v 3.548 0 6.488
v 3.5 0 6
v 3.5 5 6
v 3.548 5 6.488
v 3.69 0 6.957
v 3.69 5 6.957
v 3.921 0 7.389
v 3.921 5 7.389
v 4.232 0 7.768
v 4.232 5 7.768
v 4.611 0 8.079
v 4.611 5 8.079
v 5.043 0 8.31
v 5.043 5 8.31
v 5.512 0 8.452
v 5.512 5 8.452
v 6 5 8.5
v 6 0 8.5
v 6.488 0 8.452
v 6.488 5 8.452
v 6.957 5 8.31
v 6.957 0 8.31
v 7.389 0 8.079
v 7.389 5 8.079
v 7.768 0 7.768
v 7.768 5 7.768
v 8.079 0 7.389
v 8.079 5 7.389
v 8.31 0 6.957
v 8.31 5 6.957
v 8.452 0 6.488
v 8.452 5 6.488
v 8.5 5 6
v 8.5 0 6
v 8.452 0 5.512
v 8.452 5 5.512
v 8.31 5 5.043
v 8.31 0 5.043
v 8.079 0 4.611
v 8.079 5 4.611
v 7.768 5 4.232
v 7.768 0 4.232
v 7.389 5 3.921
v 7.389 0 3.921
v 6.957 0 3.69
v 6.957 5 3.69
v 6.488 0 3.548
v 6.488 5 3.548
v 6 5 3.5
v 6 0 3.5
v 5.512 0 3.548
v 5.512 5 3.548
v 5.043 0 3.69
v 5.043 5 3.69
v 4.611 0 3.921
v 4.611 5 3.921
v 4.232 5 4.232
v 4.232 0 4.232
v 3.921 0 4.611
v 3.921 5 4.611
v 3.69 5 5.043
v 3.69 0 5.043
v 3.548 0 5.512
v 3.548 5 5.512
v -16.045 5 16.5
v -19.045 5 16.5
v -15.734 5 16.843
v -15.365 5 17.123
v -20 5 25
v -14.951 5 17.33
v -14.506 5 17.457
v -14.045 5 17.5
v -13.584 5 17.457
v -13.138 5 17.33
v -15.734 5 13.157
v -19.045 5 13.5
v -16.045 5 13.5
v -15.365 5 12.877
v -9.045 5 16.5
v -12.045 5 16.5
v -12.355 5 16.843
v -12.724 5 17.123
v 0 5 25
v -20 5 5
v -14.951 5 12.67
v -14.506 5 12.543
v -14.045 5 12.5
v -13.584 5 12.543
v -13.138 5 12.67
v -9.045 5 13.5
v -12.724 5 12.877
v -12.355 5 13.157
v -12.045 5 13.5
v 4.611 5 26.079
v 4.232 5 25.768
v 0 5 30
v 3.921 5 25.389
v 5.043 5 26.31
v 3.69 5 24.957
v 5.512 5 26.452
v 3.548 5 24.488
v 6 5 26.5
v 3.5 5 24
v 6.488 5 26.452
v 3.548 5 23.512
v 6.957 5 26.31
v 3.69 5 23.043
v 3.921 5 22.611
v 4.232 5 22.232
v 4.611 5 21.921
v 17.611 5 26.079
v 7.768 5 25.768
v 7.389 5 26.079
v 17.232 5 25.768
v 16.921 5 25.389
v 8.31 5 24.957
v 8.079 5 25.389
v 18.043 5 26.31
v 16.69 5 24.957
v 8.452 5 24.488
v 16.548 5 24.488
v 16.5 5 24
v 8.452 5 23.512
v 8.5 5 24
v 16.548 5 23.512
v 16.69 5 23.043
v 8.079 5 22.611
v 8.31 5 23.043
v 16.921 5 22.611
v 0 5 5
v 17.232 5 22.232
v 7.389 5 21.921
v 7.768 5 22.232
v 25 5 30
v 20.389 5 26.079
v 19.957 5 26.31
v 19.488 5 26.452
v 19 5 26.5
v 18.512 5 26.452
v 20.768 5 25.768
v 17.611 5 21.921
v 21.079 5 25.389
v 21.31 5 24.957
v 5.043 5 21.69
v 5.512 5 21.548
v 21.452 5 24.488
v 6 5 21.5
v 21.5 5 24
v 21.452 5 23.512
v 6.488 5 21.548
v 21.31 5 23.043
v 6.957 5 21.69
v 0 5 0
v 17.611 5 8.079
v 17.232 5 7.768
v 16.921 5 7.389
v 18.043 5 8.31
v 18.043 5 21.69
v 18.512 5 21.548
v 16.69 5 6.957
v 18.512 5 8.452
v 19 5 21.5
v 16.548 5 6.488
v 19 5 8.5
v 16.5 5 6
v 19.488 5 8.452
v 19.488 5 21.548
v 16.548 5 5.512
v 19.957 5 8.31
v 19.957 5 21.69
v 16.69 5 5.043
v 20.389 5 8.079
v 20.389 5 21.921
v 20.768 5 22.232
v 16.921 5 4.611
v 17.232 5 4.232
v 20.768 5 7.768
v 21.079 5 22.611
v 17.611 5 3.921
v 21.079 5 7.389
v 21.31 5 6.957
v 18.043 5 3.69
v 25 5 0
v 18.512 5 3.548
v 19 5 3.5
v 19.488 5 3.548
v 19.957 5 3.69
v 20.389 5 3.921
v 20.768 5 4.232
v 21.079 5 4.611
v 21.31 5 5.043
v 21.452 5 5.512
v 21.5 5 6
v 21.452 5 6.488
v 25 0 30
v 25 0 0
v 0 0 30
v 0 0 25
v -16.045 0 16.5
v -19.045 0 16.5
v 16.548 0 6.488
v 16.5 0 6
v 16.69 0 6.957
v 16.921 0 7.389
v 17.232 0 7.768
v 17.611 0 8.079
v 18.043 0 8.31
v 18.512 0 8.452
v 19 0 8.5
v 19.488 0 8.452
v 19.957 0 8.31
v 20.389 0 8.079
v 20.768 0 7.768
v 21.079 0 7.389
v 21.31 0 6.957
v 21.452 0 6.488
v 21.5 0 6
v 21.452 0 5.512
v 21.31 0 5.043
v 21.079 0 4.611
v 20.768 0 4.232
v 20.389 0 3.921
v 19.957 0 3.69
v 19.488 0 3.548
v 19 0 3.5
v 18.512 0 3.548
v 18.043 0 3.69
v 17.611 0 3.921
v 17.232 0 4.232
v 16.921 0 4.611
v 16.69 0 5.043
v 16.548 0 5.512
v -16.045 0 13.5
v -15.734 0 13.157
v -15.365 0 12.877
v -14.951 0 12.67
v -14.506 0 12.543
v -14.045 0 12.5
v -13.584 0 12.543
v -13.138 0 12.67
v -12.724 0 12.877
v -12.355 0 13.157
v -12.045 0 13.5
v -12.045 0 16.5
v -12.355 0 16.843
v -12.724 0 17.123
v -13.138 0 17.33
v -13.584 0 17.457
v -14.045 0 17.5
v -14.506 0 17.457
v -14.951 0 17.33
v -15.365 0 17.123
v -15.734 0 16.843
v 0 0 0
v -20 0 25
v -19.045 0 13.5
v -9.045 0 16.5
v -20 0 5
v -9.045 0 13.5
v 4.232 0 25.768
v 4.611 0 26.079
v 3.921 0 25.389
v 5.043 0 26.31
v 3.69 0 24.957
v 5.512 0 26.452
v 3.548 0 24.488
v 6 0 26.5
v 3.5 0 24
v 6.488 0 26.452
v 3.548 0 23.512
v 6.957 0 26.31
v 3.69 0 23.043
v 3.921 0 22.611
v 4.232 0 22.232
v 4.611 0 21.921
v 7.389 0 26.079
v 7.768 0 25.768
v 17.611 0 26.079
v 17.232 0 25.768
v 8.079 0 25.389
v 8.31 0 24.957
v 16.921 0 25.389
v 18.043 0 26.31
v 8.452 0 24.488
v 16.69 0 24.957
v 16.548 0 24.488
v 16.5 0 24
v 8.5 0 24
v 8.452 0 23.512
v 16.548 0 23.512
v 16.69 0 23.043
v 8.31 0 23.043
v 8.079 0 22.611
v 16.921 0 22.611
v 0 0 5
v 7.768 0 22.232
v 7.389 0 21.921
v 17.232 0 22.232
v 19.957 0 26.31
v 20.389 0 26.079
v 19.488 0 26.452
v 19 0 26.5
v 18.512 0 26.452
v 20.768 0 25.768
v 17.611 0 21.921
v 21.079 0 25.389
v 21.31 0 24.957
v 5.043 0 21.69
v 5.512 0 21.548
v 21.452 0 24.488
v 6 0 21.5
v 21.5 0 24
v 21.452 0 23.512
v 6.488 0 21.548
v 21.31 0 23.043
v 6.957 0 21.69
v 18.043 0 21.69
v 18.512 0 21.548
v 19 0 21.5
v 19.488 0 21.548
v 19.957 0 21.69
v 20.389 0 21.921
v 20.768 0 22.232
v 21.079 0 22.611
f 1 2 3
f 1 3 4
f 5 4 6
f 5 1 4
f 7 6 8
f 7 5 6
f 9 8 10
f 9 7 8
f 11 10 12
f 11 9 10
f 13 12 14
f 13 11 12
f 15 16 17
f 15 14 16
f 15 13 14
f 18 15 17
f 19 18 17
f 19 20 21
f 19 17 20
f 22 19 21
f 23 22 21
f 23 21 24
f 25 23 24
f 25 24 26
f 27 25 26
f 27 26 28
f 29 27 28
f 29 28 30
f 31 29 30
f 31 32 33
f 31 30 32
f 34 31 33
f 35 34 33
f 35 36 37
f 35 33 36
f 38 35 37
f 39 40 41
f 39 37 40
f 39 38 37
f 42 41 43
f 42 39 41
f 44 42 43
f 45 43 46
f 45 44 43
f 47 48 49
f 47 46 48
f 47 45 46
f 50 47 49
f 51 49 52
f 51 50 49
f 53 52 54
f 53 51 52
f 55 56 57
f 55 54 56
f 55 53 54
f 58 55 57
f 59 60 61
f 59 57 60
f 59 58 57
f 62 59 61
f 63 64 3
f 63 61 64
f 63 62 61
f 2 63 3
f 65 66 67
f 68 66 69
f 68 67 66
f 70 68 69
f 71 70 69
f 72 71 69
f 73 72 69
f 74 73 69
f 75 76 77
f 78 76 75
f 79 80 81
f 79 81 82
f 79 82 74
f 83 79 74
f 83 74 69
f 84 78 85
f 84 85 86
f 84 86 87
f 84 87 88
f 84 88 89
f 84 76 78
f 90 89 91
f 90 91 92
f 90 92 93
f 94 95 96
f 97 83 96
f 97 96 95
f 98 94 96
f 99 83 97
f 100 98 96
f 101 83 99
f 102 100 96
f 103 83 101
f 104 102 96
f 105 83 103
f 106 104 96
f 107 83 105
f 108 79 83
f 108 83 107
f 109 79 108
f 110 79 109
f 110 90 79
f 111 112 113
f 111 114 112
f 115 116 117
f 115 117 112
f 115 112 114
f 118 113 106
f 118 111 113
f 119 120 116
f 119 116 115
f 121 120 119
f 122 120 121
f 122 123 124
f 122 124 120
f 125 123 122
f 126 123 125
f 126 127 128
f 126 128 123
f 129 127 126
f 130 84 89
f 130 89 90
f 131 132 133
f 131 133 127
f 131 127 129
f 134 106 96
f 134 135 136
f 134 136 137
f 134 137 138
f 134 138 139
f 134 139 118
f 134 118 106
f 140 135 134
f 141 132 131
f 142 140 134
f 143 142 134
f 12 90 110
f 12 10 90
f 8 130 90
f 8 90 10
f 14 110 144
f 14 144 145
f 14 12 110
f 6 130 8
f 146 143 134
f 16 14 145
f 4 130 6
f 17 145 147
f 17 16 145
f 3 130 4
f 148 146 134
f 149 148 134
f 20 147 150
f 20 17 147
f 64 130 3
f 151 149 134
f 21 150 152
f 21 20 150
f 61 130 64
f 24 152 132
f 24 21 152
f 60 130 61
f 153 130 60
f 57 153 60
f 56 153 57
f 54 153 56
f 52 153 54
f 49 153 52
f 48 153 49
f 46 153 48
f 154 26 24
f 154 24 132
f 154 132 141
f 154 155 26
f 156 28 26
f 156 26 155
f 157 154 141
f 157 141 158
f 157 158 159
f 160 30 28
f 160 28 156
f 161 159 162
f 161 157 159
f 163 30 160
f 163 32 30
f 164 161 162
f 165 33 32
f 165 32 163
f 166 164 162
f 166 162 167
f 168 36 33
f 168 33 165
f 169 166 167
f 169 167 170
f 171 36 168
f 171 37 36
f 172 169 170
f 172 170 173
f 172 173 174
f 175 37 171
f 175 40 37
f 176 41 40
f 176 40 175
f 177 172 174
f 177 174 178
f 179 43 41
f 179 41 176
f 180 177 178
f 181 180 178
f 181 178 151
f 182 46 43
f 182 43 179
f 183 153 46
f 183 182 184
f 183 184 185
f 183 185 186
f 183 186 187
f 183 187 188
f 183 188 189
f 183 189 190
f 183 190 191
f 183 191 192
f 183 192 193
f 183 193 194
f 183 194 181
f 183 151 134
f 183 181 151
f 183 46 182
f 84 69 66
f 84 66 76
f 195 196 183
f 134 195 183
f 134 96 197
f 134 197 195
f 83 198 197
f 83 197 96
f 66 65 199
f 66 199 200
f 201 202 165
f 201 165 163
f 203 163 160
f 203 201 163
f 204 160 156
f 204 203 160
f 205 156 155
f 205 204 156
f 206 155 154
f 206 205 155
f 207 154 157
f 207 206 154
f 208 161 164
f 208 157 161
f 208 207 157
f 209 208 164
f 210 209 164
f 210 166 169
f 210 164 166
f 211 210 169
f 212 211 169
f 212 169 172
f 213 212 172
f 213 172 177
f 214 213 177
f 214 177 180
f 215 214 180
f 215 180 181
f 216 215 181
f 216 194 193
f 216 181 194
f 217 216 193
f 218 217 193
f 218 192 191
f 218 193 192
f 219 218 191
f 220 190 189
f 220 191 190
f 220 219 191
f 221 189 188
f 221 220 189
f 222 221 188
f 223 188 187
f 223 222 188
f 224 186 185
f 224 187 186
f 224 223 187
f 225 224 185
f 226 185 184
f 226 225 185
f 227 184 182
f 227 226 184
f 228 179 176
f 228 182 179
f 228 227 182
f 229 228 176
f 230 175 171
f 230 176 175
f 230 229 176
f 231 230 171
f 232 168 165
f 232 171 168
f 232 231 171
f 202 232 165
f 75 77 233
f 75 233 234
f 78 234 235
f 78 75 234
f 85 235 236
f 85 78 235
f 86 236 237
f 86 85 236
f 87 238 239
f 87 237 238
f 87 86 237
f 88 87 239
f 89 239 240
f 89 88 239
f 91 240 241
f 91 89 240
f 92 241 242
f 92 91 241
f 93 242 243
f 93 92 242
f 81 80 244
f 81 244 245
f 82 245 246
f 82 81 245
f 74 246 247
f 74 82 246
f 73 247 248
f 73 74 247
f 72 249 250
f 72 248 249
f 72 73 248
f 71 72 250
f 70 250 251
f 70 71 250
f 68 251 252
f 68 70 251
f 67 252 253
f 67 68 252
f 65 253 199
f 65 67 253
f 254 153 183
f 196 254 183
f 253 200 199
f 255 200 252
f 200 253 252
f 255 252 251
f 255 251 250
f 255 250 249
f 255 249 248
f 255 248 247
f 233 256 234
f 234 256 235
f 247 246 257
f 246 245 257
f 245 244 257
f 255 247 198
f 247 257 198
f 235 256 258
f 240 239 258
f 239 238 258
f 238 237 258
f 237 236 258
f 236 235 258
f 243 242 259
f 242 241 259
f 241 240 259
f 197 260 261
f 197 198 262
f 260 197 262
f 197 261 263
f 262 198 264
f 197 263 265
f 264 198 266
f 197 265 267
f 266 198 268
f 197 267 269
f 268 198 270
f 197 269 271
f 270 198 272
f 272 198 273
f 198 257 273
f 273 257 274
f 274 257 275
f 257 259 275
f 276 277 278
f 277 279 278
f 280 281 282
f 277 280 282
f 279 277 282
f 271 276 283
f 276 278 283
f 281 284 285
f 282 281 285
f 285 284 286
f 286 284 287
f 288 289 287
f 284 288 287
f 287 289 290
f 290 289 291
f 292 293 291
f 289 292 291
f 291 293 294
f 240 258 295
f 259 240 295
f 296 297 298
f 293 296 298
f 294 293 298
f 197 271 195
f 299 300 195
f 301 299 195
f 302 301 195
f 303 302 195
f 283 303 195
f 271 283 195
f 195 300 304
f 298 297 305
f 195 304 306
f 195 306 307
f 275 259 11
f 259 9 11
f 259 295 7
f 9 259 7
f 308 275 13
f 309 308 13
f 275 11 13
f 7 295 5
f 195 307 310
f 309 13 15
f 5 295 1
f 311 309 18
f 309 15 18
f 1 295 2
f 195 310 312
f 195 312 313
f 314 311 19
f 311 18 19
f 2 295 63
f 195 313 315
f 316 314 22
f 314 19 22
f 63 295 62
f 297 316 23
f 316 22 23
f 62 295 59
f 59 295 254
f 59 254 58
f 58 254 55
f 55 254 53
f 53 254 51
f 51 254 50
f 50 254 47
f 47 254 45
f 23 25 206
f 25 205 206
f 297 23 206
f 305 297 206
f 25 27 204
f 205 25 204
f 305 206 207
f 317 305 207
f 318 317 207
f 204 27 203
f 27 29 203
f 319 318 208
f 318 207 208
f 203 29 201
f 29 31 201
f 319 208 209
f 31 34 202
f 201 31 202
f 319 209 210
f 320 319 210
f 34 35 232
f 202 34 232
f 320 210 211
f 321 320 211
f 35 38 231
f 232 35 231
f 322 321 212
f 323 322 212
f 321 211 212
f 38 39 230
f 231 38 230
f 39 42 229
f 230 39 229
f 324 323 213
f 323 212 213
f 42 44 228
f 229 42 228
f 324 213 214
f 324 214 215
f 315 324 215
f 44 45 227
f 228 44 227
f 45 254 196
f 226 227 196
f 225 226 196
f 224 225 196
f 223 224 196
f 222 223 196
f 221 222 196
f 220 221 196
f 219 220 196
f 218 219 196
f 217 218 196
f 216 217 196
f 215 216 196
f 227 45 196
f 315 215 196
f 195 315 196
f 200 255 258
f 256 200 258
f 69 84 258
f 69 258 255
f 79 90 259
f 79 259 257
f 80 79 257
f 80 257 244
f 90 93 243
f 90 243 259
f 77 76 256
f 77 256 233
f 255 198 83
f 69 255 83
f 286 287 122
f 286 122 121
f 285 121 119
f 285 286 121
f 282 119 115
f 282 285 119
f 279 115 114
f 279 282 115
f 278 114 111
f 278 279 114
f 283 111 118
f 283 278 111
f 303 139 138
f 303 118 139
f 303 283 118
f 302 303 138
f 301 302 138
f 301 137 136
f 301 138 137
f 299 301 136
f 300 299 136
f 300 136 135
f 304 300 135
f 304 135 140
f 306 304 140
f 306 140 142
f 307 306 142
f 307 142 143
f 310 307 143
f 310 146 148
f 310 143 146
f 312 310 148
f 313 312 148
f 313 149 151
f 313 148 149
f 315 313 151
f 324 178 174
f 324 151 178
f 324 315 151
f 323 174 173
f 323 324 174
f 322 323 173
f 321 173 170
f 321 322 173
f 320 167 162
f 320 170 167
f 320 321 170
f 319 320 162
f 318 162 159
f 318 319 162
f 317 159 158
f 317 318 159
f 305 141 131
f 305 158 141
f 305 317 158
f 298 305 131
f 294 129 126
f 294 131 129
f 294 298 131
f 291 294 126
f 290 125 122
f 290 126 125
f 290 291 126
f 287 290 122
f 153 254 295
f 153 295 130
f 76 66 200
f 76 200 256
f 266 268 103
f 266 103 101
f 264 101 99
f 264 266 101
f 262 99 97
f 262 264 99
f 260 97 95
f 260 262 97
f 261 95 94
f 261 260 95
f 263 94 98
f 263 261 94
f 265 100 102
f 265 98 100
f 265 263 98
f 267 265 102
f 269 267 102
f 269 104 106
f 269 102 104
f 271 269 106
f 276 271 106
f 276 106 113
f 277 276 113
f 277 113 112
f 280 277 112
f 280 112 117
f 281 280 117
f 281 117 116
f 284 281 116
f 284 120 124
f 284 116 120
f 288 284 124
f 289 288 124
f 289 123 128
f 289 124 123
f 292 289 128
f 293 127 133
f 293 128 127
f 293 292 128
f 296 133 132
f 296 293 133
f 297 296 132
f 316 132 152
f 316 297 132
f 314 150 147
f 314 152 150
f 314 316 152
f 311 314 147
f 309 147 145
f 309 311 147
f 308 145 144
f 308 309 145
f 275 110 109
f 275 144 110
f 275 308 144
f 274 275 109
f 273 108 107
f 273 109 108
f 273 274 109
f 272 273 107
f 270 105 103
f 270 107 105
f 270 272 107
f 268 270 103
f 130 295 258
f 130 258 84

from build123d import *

# Parameters (mm, degrees)
SKETCH1_W               = 25
SKETCH1_H               = 5
BOSS_EXTRUDE2_DEPTH     = 30
CUT_EXTRUDE1_DEPTH      = 40.37003937
CUT_EXTRUDE1_DEPTH_BACK = 40.37003937
SKETCH2_R               = 2.5
SKETCH5_W               = 20
SKETCH5_H               = 5
BOSS_EXTRUDE3_DEPTH     = 20
CUT_EXTRUDE3_DEPTH      = 40.37003937


with BuildPart() as part:
    # Sketch1 → Boss-Extrude2 (new body)
    with BuildSketch(Plane.XY):
        with Locations((12.5, 2.5)):
            Rectangle(SKETCH1_W, SKETCH1_H)
    extrude(amount=BOSS_EXTRUDE2_DEPTH)

    # Sketch2 → Cut-Extrude1 (cut, two sides: drawn at the far end of the back side and taken through both)
    with BuildSketch(Plane(origin=(0, 5, 0), x_dir=(1, 0, 0), z_dir=(0, 1, 0)).offset(-CUT_EXTRUDE1_DEPTH_BACK)):
        with Locations(Location((6, -6, 0), (0, 0, 180))):
            Circle(SKETCH2_R)
        with Locations(Location((19, -6, 0), (0, 0, 180))):
            Circle(SKETCH2_R)
        with Locations(Location((19, -24, 0), (0, 0, 180))):
            Circle(SKETCH2_R)
        with Locations(Location((6, -24, 0), (0, 0, 180))):
            Circle(SKETCH2_R)
    extrude(amount=CUT_EXTRUDE1_DEPTH + CUT_EXTRUDE1_DEPTH_BACK, mode=Mode.SUBTRACT)

    # Sketch5 → Boss-Extrude3 (add)
    with BuildSketch(Plane.ZY):
        with Locations((15, 2.5)):
            Rectangle(SKETCH5_W, SKETCH5_H)
    extrude(amount=BOSS_EXTRUDE3_DEPTH)

    # Sketch6 → Cut-Extrude3 (cut, through all)
    with BuildSketch(Plane(origin=(0, 5, 0), x_dir=(1, 0, 0), z_dir=(0, 1, 0))):
        with BuildLine():
            Line((-12.044559796, -13.5), (-9.044559796, -13.5))
            Line((-9.044559796, -13.5), (-9.044559796, -16.5))
            Line((-9.044559796, -16.5), (-12.044559796, -16.5))
            ThreePointArc((-12.044559796, -16.5), (-14.044559796, -17.5), (-16.044559796, -16.5))
            Line((-16.044559796, -16.5), (-19.044559796, -16.5))
            Line((-19.044559796, -16.5), (-19.044559796, -13.5))
            Line((-19.044559796, -13.5), (-16.044559796, -13.5))
            ThreePointArc((-16.044559796, -13.5), (-14.044559796, -12.5), (-12.044559796, -13.5))
        make_face()
    extrude(amount=-CUT_EXTRUDE3_DEPTH, mode=Mode.SUBTRACT)


solid = part.part
